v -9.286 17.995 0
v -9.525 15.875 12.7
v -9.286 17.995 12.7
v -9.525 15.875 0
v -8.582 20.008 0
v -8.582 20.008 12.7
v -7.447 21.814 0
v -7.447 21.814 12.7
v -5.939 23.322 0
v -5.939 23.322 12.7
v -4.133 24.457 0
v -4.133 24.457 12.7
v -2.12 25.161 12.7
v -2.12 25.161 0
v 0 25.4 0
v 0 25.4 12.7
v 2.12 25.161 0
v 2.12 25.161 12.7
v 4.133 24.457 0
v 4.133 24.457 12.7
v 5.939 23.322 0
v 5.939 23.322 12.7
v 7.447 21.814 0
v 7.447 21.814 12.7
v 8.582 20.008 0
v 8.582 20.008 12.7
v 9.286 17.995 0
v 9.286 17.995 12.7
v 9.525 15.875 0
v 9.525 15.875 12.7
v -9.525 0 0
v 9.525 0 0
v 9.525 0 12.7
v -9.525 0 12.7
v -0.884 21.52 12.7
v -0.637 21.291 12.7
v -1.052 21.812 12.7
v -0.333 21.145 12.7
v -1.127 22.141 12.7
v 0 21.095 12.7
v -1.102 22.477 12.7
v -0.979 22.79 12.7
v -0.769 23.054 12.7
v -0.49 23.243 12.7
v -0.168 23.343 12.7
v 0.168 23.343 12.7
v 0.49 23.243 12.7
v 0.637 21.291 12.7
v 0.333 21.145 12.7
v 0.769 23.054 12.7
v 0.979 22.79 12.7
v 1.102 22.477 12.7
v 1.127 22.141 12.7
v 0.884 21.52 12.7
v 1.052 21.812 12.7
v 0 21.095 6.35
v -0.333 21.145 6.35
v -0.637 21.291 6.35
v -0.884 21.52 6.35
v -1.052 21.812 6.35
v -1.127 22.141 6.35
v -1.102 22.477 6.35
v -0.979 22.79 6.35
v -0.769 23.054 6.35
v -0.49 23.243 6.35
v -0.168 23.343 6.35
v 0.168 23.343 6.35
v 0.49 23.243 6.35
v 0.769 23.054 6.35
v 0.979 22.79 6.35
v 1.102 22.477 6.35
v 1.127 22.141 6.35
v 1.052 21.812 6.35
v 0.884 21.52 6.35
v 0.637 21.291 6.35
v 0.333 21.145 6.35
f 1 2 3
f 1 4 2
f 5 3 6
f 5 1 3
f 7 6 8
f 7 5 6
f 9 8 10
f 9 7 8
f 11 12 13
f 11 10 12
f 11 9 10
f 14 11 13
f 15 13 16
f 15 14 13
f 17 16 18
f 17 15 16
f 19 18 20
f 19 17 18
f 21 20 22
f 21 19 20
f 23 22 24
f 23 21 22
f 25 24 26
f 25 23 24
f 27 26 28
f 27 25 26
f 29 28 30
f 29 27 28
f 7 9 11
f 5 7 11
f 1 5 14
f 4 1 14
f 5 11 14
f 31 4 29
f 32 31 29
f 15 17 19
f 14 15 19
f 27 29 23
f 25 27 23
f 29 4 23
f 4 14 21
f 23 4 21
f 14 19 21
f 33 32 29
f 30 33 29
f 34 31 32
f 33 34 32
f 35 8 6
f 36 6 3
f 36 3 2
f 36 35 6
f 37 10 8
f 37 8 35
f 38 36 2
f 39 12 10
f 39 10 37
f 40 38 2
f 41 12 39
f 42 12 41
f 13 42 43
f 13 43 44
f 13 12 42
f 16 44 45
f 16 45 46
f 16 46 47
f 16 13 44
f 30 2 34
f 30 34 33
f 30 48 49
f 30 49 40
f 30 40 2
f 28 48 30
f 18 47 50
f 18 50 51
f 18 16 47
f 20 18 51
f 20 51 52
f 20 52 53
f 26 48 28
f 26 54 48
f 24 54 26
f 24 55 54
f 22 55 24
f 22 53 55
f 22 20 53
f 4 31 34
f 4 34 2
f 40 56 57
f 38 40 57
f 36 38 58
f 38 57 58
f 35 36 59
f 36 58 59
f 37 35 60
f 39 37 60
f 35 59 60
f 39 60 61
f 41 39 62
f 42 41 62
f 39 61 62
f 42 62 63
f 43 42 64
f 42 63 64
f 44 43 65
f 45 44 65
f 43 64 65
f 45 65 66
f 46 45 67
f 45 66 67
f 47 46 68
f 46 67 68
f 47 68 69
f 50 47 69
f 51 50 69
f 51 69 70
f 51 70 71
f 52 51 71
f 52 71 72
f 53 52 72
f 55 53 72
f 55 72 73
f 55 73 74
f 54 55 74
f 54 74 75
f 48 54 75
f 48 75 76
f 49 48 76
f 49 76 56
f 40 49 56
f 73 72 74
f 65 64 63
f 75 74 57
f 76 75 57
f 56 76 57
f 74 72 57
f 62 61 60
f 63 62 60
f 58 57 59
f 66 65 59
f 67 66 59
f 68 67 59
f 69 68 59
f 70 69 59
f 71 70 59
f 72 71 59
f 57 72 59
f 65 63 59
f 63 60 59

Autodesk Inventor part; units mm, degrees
ref_plane "YZ Plane" through (0, 0, 0) normal (1, 0, 0) x (0, 1, 0)
ref_plane "XZ Plane" through (0, 0, 0) normal (0, 1, 0) x (-1, 0, 0)
ref_plane "XY Plane" through (0, 0, 0) normal (0, 0, 1) x (1, 0, 0)
sketch "Sketch1" plane through (0, 0, 0) normal (0, 0, 1) x (1, 0, 0)
  line L0 (-9.525, 0) -> (9.525, 0)
  line L1 (9.525, 0) -> (9.525, 15.875)
  line L2 (-9.525, 0) -> (-9.525, 15.875)
  arc A0 (9.525, 15.875) -> (-9.525, 15.875) centre (0, 15.875) ccw
  point P0 (0, 0)
  dimension "d0" = 19.05
  dimension "d1" = 9.525
  dimension "d2" = 9.525
  dimension "d3" = 15.875
extrude "Extrusion1" add sketch "Sketch1" along normal blind 12.7
hole "Hole1" at (0, 22.225, 12.7) direction (0, 0, -1) diameter 2.2606 depth 6.35
equation "\"d1\" = 0.5 * d0"
properties part number "Rudder_Bracket"
